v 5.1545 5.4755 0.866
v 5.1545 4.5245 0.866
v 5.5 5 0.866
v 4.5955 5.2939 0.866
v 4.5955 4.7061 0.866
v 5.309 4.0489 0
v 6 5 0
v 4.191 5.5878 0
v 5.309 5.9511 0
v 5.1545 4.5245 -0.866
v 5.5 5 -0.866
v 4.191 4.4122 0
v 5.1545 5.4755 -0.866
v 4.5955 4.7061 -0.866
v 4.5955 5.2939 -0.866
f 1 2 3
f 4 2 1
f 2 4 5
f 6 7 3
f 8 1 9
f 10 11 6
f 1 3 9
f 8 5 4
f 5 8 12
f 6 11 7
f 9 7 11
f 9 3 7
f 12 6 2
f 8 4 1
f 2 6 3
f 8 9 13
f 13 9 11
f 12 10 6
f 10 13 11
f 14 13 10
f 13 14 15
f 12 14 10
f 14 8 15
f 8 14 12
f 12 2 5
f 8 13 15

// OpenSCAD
function cat(L1, L2) = [for (i=[0:len(L1)+len(L2)-1])
                        i < len(L1)? L1[i] : L2[i-len(L1)]] ;


module dish(type = "sphere", sides = 10, length = 10){

  //TODO length scaling

  function pointyDish(x,y) = (x == 0 || y == 0 || x== sides || y == sides ) ? 0 : abs(5-x) + abs(5-y);

  /*
  matrix looks like this:
  [
  [0, 0, 0], [0, 1, 0], [0, 2, 0],
  [1, 0, 0], [1, 1, 0], [1, 2, 0],
  [2, 0, 0], [2, 1, 0], [2, 2, 0]
  ]
  */
  // row is how many verts are actually in a row
  row = sides + 1;

  // first make an x-first matrix of points. (0,0), (1,0) etc
  matrix = cat([
    for ( y = [0 : sides], x = [ 0 : sides ]) [x, y, pointyDish(x,y)]
  ], [[sides / 2, sides / 2, 0]]);

  echo(matrix);

  echo(matrix[121]);

  echo(len(matrix));

  translate([sides / 2, sides / 2, 0]) sphere(r=1);

  // then make 2 faces for each set of four points: (0,1,4), (0,4,3)
  // sides - 1 because we are doing this fromt the bottom left corner and extending up and out 1 vertex
  // so the rightmost and topmost vertexes are already covered
  f1 = [
    for (y = [0 : sides-1], x = [ 0 : sides-1 ], num = [0, 1]) (
      num == 0 ?
        [(x + row * y), (x + row * y + 1), (x + row * y + 1 + row)] :
        [(x + row * y), (x + row * y + 1 + row), (x + row * y + row)])
  ];

  f2 = cat(f1, [for (n = [0: sides-1]) [n, n+1, len(matrix) - 1]]);

  faces = cat(f2, [for (n = [len(matrix) - sides-1 : len(matrix)]) [n-1, n, len(matrix) - 1]]);
  // add

  /*
  faces needs to start like this:
  [
    [0,1,4,3],
    [1,2,5,4]
  ]*/

  /*index, index + 1, index + 1 + row, index + row*/

  polyhedron(points = matrix, faces=faces);

}

dish();
